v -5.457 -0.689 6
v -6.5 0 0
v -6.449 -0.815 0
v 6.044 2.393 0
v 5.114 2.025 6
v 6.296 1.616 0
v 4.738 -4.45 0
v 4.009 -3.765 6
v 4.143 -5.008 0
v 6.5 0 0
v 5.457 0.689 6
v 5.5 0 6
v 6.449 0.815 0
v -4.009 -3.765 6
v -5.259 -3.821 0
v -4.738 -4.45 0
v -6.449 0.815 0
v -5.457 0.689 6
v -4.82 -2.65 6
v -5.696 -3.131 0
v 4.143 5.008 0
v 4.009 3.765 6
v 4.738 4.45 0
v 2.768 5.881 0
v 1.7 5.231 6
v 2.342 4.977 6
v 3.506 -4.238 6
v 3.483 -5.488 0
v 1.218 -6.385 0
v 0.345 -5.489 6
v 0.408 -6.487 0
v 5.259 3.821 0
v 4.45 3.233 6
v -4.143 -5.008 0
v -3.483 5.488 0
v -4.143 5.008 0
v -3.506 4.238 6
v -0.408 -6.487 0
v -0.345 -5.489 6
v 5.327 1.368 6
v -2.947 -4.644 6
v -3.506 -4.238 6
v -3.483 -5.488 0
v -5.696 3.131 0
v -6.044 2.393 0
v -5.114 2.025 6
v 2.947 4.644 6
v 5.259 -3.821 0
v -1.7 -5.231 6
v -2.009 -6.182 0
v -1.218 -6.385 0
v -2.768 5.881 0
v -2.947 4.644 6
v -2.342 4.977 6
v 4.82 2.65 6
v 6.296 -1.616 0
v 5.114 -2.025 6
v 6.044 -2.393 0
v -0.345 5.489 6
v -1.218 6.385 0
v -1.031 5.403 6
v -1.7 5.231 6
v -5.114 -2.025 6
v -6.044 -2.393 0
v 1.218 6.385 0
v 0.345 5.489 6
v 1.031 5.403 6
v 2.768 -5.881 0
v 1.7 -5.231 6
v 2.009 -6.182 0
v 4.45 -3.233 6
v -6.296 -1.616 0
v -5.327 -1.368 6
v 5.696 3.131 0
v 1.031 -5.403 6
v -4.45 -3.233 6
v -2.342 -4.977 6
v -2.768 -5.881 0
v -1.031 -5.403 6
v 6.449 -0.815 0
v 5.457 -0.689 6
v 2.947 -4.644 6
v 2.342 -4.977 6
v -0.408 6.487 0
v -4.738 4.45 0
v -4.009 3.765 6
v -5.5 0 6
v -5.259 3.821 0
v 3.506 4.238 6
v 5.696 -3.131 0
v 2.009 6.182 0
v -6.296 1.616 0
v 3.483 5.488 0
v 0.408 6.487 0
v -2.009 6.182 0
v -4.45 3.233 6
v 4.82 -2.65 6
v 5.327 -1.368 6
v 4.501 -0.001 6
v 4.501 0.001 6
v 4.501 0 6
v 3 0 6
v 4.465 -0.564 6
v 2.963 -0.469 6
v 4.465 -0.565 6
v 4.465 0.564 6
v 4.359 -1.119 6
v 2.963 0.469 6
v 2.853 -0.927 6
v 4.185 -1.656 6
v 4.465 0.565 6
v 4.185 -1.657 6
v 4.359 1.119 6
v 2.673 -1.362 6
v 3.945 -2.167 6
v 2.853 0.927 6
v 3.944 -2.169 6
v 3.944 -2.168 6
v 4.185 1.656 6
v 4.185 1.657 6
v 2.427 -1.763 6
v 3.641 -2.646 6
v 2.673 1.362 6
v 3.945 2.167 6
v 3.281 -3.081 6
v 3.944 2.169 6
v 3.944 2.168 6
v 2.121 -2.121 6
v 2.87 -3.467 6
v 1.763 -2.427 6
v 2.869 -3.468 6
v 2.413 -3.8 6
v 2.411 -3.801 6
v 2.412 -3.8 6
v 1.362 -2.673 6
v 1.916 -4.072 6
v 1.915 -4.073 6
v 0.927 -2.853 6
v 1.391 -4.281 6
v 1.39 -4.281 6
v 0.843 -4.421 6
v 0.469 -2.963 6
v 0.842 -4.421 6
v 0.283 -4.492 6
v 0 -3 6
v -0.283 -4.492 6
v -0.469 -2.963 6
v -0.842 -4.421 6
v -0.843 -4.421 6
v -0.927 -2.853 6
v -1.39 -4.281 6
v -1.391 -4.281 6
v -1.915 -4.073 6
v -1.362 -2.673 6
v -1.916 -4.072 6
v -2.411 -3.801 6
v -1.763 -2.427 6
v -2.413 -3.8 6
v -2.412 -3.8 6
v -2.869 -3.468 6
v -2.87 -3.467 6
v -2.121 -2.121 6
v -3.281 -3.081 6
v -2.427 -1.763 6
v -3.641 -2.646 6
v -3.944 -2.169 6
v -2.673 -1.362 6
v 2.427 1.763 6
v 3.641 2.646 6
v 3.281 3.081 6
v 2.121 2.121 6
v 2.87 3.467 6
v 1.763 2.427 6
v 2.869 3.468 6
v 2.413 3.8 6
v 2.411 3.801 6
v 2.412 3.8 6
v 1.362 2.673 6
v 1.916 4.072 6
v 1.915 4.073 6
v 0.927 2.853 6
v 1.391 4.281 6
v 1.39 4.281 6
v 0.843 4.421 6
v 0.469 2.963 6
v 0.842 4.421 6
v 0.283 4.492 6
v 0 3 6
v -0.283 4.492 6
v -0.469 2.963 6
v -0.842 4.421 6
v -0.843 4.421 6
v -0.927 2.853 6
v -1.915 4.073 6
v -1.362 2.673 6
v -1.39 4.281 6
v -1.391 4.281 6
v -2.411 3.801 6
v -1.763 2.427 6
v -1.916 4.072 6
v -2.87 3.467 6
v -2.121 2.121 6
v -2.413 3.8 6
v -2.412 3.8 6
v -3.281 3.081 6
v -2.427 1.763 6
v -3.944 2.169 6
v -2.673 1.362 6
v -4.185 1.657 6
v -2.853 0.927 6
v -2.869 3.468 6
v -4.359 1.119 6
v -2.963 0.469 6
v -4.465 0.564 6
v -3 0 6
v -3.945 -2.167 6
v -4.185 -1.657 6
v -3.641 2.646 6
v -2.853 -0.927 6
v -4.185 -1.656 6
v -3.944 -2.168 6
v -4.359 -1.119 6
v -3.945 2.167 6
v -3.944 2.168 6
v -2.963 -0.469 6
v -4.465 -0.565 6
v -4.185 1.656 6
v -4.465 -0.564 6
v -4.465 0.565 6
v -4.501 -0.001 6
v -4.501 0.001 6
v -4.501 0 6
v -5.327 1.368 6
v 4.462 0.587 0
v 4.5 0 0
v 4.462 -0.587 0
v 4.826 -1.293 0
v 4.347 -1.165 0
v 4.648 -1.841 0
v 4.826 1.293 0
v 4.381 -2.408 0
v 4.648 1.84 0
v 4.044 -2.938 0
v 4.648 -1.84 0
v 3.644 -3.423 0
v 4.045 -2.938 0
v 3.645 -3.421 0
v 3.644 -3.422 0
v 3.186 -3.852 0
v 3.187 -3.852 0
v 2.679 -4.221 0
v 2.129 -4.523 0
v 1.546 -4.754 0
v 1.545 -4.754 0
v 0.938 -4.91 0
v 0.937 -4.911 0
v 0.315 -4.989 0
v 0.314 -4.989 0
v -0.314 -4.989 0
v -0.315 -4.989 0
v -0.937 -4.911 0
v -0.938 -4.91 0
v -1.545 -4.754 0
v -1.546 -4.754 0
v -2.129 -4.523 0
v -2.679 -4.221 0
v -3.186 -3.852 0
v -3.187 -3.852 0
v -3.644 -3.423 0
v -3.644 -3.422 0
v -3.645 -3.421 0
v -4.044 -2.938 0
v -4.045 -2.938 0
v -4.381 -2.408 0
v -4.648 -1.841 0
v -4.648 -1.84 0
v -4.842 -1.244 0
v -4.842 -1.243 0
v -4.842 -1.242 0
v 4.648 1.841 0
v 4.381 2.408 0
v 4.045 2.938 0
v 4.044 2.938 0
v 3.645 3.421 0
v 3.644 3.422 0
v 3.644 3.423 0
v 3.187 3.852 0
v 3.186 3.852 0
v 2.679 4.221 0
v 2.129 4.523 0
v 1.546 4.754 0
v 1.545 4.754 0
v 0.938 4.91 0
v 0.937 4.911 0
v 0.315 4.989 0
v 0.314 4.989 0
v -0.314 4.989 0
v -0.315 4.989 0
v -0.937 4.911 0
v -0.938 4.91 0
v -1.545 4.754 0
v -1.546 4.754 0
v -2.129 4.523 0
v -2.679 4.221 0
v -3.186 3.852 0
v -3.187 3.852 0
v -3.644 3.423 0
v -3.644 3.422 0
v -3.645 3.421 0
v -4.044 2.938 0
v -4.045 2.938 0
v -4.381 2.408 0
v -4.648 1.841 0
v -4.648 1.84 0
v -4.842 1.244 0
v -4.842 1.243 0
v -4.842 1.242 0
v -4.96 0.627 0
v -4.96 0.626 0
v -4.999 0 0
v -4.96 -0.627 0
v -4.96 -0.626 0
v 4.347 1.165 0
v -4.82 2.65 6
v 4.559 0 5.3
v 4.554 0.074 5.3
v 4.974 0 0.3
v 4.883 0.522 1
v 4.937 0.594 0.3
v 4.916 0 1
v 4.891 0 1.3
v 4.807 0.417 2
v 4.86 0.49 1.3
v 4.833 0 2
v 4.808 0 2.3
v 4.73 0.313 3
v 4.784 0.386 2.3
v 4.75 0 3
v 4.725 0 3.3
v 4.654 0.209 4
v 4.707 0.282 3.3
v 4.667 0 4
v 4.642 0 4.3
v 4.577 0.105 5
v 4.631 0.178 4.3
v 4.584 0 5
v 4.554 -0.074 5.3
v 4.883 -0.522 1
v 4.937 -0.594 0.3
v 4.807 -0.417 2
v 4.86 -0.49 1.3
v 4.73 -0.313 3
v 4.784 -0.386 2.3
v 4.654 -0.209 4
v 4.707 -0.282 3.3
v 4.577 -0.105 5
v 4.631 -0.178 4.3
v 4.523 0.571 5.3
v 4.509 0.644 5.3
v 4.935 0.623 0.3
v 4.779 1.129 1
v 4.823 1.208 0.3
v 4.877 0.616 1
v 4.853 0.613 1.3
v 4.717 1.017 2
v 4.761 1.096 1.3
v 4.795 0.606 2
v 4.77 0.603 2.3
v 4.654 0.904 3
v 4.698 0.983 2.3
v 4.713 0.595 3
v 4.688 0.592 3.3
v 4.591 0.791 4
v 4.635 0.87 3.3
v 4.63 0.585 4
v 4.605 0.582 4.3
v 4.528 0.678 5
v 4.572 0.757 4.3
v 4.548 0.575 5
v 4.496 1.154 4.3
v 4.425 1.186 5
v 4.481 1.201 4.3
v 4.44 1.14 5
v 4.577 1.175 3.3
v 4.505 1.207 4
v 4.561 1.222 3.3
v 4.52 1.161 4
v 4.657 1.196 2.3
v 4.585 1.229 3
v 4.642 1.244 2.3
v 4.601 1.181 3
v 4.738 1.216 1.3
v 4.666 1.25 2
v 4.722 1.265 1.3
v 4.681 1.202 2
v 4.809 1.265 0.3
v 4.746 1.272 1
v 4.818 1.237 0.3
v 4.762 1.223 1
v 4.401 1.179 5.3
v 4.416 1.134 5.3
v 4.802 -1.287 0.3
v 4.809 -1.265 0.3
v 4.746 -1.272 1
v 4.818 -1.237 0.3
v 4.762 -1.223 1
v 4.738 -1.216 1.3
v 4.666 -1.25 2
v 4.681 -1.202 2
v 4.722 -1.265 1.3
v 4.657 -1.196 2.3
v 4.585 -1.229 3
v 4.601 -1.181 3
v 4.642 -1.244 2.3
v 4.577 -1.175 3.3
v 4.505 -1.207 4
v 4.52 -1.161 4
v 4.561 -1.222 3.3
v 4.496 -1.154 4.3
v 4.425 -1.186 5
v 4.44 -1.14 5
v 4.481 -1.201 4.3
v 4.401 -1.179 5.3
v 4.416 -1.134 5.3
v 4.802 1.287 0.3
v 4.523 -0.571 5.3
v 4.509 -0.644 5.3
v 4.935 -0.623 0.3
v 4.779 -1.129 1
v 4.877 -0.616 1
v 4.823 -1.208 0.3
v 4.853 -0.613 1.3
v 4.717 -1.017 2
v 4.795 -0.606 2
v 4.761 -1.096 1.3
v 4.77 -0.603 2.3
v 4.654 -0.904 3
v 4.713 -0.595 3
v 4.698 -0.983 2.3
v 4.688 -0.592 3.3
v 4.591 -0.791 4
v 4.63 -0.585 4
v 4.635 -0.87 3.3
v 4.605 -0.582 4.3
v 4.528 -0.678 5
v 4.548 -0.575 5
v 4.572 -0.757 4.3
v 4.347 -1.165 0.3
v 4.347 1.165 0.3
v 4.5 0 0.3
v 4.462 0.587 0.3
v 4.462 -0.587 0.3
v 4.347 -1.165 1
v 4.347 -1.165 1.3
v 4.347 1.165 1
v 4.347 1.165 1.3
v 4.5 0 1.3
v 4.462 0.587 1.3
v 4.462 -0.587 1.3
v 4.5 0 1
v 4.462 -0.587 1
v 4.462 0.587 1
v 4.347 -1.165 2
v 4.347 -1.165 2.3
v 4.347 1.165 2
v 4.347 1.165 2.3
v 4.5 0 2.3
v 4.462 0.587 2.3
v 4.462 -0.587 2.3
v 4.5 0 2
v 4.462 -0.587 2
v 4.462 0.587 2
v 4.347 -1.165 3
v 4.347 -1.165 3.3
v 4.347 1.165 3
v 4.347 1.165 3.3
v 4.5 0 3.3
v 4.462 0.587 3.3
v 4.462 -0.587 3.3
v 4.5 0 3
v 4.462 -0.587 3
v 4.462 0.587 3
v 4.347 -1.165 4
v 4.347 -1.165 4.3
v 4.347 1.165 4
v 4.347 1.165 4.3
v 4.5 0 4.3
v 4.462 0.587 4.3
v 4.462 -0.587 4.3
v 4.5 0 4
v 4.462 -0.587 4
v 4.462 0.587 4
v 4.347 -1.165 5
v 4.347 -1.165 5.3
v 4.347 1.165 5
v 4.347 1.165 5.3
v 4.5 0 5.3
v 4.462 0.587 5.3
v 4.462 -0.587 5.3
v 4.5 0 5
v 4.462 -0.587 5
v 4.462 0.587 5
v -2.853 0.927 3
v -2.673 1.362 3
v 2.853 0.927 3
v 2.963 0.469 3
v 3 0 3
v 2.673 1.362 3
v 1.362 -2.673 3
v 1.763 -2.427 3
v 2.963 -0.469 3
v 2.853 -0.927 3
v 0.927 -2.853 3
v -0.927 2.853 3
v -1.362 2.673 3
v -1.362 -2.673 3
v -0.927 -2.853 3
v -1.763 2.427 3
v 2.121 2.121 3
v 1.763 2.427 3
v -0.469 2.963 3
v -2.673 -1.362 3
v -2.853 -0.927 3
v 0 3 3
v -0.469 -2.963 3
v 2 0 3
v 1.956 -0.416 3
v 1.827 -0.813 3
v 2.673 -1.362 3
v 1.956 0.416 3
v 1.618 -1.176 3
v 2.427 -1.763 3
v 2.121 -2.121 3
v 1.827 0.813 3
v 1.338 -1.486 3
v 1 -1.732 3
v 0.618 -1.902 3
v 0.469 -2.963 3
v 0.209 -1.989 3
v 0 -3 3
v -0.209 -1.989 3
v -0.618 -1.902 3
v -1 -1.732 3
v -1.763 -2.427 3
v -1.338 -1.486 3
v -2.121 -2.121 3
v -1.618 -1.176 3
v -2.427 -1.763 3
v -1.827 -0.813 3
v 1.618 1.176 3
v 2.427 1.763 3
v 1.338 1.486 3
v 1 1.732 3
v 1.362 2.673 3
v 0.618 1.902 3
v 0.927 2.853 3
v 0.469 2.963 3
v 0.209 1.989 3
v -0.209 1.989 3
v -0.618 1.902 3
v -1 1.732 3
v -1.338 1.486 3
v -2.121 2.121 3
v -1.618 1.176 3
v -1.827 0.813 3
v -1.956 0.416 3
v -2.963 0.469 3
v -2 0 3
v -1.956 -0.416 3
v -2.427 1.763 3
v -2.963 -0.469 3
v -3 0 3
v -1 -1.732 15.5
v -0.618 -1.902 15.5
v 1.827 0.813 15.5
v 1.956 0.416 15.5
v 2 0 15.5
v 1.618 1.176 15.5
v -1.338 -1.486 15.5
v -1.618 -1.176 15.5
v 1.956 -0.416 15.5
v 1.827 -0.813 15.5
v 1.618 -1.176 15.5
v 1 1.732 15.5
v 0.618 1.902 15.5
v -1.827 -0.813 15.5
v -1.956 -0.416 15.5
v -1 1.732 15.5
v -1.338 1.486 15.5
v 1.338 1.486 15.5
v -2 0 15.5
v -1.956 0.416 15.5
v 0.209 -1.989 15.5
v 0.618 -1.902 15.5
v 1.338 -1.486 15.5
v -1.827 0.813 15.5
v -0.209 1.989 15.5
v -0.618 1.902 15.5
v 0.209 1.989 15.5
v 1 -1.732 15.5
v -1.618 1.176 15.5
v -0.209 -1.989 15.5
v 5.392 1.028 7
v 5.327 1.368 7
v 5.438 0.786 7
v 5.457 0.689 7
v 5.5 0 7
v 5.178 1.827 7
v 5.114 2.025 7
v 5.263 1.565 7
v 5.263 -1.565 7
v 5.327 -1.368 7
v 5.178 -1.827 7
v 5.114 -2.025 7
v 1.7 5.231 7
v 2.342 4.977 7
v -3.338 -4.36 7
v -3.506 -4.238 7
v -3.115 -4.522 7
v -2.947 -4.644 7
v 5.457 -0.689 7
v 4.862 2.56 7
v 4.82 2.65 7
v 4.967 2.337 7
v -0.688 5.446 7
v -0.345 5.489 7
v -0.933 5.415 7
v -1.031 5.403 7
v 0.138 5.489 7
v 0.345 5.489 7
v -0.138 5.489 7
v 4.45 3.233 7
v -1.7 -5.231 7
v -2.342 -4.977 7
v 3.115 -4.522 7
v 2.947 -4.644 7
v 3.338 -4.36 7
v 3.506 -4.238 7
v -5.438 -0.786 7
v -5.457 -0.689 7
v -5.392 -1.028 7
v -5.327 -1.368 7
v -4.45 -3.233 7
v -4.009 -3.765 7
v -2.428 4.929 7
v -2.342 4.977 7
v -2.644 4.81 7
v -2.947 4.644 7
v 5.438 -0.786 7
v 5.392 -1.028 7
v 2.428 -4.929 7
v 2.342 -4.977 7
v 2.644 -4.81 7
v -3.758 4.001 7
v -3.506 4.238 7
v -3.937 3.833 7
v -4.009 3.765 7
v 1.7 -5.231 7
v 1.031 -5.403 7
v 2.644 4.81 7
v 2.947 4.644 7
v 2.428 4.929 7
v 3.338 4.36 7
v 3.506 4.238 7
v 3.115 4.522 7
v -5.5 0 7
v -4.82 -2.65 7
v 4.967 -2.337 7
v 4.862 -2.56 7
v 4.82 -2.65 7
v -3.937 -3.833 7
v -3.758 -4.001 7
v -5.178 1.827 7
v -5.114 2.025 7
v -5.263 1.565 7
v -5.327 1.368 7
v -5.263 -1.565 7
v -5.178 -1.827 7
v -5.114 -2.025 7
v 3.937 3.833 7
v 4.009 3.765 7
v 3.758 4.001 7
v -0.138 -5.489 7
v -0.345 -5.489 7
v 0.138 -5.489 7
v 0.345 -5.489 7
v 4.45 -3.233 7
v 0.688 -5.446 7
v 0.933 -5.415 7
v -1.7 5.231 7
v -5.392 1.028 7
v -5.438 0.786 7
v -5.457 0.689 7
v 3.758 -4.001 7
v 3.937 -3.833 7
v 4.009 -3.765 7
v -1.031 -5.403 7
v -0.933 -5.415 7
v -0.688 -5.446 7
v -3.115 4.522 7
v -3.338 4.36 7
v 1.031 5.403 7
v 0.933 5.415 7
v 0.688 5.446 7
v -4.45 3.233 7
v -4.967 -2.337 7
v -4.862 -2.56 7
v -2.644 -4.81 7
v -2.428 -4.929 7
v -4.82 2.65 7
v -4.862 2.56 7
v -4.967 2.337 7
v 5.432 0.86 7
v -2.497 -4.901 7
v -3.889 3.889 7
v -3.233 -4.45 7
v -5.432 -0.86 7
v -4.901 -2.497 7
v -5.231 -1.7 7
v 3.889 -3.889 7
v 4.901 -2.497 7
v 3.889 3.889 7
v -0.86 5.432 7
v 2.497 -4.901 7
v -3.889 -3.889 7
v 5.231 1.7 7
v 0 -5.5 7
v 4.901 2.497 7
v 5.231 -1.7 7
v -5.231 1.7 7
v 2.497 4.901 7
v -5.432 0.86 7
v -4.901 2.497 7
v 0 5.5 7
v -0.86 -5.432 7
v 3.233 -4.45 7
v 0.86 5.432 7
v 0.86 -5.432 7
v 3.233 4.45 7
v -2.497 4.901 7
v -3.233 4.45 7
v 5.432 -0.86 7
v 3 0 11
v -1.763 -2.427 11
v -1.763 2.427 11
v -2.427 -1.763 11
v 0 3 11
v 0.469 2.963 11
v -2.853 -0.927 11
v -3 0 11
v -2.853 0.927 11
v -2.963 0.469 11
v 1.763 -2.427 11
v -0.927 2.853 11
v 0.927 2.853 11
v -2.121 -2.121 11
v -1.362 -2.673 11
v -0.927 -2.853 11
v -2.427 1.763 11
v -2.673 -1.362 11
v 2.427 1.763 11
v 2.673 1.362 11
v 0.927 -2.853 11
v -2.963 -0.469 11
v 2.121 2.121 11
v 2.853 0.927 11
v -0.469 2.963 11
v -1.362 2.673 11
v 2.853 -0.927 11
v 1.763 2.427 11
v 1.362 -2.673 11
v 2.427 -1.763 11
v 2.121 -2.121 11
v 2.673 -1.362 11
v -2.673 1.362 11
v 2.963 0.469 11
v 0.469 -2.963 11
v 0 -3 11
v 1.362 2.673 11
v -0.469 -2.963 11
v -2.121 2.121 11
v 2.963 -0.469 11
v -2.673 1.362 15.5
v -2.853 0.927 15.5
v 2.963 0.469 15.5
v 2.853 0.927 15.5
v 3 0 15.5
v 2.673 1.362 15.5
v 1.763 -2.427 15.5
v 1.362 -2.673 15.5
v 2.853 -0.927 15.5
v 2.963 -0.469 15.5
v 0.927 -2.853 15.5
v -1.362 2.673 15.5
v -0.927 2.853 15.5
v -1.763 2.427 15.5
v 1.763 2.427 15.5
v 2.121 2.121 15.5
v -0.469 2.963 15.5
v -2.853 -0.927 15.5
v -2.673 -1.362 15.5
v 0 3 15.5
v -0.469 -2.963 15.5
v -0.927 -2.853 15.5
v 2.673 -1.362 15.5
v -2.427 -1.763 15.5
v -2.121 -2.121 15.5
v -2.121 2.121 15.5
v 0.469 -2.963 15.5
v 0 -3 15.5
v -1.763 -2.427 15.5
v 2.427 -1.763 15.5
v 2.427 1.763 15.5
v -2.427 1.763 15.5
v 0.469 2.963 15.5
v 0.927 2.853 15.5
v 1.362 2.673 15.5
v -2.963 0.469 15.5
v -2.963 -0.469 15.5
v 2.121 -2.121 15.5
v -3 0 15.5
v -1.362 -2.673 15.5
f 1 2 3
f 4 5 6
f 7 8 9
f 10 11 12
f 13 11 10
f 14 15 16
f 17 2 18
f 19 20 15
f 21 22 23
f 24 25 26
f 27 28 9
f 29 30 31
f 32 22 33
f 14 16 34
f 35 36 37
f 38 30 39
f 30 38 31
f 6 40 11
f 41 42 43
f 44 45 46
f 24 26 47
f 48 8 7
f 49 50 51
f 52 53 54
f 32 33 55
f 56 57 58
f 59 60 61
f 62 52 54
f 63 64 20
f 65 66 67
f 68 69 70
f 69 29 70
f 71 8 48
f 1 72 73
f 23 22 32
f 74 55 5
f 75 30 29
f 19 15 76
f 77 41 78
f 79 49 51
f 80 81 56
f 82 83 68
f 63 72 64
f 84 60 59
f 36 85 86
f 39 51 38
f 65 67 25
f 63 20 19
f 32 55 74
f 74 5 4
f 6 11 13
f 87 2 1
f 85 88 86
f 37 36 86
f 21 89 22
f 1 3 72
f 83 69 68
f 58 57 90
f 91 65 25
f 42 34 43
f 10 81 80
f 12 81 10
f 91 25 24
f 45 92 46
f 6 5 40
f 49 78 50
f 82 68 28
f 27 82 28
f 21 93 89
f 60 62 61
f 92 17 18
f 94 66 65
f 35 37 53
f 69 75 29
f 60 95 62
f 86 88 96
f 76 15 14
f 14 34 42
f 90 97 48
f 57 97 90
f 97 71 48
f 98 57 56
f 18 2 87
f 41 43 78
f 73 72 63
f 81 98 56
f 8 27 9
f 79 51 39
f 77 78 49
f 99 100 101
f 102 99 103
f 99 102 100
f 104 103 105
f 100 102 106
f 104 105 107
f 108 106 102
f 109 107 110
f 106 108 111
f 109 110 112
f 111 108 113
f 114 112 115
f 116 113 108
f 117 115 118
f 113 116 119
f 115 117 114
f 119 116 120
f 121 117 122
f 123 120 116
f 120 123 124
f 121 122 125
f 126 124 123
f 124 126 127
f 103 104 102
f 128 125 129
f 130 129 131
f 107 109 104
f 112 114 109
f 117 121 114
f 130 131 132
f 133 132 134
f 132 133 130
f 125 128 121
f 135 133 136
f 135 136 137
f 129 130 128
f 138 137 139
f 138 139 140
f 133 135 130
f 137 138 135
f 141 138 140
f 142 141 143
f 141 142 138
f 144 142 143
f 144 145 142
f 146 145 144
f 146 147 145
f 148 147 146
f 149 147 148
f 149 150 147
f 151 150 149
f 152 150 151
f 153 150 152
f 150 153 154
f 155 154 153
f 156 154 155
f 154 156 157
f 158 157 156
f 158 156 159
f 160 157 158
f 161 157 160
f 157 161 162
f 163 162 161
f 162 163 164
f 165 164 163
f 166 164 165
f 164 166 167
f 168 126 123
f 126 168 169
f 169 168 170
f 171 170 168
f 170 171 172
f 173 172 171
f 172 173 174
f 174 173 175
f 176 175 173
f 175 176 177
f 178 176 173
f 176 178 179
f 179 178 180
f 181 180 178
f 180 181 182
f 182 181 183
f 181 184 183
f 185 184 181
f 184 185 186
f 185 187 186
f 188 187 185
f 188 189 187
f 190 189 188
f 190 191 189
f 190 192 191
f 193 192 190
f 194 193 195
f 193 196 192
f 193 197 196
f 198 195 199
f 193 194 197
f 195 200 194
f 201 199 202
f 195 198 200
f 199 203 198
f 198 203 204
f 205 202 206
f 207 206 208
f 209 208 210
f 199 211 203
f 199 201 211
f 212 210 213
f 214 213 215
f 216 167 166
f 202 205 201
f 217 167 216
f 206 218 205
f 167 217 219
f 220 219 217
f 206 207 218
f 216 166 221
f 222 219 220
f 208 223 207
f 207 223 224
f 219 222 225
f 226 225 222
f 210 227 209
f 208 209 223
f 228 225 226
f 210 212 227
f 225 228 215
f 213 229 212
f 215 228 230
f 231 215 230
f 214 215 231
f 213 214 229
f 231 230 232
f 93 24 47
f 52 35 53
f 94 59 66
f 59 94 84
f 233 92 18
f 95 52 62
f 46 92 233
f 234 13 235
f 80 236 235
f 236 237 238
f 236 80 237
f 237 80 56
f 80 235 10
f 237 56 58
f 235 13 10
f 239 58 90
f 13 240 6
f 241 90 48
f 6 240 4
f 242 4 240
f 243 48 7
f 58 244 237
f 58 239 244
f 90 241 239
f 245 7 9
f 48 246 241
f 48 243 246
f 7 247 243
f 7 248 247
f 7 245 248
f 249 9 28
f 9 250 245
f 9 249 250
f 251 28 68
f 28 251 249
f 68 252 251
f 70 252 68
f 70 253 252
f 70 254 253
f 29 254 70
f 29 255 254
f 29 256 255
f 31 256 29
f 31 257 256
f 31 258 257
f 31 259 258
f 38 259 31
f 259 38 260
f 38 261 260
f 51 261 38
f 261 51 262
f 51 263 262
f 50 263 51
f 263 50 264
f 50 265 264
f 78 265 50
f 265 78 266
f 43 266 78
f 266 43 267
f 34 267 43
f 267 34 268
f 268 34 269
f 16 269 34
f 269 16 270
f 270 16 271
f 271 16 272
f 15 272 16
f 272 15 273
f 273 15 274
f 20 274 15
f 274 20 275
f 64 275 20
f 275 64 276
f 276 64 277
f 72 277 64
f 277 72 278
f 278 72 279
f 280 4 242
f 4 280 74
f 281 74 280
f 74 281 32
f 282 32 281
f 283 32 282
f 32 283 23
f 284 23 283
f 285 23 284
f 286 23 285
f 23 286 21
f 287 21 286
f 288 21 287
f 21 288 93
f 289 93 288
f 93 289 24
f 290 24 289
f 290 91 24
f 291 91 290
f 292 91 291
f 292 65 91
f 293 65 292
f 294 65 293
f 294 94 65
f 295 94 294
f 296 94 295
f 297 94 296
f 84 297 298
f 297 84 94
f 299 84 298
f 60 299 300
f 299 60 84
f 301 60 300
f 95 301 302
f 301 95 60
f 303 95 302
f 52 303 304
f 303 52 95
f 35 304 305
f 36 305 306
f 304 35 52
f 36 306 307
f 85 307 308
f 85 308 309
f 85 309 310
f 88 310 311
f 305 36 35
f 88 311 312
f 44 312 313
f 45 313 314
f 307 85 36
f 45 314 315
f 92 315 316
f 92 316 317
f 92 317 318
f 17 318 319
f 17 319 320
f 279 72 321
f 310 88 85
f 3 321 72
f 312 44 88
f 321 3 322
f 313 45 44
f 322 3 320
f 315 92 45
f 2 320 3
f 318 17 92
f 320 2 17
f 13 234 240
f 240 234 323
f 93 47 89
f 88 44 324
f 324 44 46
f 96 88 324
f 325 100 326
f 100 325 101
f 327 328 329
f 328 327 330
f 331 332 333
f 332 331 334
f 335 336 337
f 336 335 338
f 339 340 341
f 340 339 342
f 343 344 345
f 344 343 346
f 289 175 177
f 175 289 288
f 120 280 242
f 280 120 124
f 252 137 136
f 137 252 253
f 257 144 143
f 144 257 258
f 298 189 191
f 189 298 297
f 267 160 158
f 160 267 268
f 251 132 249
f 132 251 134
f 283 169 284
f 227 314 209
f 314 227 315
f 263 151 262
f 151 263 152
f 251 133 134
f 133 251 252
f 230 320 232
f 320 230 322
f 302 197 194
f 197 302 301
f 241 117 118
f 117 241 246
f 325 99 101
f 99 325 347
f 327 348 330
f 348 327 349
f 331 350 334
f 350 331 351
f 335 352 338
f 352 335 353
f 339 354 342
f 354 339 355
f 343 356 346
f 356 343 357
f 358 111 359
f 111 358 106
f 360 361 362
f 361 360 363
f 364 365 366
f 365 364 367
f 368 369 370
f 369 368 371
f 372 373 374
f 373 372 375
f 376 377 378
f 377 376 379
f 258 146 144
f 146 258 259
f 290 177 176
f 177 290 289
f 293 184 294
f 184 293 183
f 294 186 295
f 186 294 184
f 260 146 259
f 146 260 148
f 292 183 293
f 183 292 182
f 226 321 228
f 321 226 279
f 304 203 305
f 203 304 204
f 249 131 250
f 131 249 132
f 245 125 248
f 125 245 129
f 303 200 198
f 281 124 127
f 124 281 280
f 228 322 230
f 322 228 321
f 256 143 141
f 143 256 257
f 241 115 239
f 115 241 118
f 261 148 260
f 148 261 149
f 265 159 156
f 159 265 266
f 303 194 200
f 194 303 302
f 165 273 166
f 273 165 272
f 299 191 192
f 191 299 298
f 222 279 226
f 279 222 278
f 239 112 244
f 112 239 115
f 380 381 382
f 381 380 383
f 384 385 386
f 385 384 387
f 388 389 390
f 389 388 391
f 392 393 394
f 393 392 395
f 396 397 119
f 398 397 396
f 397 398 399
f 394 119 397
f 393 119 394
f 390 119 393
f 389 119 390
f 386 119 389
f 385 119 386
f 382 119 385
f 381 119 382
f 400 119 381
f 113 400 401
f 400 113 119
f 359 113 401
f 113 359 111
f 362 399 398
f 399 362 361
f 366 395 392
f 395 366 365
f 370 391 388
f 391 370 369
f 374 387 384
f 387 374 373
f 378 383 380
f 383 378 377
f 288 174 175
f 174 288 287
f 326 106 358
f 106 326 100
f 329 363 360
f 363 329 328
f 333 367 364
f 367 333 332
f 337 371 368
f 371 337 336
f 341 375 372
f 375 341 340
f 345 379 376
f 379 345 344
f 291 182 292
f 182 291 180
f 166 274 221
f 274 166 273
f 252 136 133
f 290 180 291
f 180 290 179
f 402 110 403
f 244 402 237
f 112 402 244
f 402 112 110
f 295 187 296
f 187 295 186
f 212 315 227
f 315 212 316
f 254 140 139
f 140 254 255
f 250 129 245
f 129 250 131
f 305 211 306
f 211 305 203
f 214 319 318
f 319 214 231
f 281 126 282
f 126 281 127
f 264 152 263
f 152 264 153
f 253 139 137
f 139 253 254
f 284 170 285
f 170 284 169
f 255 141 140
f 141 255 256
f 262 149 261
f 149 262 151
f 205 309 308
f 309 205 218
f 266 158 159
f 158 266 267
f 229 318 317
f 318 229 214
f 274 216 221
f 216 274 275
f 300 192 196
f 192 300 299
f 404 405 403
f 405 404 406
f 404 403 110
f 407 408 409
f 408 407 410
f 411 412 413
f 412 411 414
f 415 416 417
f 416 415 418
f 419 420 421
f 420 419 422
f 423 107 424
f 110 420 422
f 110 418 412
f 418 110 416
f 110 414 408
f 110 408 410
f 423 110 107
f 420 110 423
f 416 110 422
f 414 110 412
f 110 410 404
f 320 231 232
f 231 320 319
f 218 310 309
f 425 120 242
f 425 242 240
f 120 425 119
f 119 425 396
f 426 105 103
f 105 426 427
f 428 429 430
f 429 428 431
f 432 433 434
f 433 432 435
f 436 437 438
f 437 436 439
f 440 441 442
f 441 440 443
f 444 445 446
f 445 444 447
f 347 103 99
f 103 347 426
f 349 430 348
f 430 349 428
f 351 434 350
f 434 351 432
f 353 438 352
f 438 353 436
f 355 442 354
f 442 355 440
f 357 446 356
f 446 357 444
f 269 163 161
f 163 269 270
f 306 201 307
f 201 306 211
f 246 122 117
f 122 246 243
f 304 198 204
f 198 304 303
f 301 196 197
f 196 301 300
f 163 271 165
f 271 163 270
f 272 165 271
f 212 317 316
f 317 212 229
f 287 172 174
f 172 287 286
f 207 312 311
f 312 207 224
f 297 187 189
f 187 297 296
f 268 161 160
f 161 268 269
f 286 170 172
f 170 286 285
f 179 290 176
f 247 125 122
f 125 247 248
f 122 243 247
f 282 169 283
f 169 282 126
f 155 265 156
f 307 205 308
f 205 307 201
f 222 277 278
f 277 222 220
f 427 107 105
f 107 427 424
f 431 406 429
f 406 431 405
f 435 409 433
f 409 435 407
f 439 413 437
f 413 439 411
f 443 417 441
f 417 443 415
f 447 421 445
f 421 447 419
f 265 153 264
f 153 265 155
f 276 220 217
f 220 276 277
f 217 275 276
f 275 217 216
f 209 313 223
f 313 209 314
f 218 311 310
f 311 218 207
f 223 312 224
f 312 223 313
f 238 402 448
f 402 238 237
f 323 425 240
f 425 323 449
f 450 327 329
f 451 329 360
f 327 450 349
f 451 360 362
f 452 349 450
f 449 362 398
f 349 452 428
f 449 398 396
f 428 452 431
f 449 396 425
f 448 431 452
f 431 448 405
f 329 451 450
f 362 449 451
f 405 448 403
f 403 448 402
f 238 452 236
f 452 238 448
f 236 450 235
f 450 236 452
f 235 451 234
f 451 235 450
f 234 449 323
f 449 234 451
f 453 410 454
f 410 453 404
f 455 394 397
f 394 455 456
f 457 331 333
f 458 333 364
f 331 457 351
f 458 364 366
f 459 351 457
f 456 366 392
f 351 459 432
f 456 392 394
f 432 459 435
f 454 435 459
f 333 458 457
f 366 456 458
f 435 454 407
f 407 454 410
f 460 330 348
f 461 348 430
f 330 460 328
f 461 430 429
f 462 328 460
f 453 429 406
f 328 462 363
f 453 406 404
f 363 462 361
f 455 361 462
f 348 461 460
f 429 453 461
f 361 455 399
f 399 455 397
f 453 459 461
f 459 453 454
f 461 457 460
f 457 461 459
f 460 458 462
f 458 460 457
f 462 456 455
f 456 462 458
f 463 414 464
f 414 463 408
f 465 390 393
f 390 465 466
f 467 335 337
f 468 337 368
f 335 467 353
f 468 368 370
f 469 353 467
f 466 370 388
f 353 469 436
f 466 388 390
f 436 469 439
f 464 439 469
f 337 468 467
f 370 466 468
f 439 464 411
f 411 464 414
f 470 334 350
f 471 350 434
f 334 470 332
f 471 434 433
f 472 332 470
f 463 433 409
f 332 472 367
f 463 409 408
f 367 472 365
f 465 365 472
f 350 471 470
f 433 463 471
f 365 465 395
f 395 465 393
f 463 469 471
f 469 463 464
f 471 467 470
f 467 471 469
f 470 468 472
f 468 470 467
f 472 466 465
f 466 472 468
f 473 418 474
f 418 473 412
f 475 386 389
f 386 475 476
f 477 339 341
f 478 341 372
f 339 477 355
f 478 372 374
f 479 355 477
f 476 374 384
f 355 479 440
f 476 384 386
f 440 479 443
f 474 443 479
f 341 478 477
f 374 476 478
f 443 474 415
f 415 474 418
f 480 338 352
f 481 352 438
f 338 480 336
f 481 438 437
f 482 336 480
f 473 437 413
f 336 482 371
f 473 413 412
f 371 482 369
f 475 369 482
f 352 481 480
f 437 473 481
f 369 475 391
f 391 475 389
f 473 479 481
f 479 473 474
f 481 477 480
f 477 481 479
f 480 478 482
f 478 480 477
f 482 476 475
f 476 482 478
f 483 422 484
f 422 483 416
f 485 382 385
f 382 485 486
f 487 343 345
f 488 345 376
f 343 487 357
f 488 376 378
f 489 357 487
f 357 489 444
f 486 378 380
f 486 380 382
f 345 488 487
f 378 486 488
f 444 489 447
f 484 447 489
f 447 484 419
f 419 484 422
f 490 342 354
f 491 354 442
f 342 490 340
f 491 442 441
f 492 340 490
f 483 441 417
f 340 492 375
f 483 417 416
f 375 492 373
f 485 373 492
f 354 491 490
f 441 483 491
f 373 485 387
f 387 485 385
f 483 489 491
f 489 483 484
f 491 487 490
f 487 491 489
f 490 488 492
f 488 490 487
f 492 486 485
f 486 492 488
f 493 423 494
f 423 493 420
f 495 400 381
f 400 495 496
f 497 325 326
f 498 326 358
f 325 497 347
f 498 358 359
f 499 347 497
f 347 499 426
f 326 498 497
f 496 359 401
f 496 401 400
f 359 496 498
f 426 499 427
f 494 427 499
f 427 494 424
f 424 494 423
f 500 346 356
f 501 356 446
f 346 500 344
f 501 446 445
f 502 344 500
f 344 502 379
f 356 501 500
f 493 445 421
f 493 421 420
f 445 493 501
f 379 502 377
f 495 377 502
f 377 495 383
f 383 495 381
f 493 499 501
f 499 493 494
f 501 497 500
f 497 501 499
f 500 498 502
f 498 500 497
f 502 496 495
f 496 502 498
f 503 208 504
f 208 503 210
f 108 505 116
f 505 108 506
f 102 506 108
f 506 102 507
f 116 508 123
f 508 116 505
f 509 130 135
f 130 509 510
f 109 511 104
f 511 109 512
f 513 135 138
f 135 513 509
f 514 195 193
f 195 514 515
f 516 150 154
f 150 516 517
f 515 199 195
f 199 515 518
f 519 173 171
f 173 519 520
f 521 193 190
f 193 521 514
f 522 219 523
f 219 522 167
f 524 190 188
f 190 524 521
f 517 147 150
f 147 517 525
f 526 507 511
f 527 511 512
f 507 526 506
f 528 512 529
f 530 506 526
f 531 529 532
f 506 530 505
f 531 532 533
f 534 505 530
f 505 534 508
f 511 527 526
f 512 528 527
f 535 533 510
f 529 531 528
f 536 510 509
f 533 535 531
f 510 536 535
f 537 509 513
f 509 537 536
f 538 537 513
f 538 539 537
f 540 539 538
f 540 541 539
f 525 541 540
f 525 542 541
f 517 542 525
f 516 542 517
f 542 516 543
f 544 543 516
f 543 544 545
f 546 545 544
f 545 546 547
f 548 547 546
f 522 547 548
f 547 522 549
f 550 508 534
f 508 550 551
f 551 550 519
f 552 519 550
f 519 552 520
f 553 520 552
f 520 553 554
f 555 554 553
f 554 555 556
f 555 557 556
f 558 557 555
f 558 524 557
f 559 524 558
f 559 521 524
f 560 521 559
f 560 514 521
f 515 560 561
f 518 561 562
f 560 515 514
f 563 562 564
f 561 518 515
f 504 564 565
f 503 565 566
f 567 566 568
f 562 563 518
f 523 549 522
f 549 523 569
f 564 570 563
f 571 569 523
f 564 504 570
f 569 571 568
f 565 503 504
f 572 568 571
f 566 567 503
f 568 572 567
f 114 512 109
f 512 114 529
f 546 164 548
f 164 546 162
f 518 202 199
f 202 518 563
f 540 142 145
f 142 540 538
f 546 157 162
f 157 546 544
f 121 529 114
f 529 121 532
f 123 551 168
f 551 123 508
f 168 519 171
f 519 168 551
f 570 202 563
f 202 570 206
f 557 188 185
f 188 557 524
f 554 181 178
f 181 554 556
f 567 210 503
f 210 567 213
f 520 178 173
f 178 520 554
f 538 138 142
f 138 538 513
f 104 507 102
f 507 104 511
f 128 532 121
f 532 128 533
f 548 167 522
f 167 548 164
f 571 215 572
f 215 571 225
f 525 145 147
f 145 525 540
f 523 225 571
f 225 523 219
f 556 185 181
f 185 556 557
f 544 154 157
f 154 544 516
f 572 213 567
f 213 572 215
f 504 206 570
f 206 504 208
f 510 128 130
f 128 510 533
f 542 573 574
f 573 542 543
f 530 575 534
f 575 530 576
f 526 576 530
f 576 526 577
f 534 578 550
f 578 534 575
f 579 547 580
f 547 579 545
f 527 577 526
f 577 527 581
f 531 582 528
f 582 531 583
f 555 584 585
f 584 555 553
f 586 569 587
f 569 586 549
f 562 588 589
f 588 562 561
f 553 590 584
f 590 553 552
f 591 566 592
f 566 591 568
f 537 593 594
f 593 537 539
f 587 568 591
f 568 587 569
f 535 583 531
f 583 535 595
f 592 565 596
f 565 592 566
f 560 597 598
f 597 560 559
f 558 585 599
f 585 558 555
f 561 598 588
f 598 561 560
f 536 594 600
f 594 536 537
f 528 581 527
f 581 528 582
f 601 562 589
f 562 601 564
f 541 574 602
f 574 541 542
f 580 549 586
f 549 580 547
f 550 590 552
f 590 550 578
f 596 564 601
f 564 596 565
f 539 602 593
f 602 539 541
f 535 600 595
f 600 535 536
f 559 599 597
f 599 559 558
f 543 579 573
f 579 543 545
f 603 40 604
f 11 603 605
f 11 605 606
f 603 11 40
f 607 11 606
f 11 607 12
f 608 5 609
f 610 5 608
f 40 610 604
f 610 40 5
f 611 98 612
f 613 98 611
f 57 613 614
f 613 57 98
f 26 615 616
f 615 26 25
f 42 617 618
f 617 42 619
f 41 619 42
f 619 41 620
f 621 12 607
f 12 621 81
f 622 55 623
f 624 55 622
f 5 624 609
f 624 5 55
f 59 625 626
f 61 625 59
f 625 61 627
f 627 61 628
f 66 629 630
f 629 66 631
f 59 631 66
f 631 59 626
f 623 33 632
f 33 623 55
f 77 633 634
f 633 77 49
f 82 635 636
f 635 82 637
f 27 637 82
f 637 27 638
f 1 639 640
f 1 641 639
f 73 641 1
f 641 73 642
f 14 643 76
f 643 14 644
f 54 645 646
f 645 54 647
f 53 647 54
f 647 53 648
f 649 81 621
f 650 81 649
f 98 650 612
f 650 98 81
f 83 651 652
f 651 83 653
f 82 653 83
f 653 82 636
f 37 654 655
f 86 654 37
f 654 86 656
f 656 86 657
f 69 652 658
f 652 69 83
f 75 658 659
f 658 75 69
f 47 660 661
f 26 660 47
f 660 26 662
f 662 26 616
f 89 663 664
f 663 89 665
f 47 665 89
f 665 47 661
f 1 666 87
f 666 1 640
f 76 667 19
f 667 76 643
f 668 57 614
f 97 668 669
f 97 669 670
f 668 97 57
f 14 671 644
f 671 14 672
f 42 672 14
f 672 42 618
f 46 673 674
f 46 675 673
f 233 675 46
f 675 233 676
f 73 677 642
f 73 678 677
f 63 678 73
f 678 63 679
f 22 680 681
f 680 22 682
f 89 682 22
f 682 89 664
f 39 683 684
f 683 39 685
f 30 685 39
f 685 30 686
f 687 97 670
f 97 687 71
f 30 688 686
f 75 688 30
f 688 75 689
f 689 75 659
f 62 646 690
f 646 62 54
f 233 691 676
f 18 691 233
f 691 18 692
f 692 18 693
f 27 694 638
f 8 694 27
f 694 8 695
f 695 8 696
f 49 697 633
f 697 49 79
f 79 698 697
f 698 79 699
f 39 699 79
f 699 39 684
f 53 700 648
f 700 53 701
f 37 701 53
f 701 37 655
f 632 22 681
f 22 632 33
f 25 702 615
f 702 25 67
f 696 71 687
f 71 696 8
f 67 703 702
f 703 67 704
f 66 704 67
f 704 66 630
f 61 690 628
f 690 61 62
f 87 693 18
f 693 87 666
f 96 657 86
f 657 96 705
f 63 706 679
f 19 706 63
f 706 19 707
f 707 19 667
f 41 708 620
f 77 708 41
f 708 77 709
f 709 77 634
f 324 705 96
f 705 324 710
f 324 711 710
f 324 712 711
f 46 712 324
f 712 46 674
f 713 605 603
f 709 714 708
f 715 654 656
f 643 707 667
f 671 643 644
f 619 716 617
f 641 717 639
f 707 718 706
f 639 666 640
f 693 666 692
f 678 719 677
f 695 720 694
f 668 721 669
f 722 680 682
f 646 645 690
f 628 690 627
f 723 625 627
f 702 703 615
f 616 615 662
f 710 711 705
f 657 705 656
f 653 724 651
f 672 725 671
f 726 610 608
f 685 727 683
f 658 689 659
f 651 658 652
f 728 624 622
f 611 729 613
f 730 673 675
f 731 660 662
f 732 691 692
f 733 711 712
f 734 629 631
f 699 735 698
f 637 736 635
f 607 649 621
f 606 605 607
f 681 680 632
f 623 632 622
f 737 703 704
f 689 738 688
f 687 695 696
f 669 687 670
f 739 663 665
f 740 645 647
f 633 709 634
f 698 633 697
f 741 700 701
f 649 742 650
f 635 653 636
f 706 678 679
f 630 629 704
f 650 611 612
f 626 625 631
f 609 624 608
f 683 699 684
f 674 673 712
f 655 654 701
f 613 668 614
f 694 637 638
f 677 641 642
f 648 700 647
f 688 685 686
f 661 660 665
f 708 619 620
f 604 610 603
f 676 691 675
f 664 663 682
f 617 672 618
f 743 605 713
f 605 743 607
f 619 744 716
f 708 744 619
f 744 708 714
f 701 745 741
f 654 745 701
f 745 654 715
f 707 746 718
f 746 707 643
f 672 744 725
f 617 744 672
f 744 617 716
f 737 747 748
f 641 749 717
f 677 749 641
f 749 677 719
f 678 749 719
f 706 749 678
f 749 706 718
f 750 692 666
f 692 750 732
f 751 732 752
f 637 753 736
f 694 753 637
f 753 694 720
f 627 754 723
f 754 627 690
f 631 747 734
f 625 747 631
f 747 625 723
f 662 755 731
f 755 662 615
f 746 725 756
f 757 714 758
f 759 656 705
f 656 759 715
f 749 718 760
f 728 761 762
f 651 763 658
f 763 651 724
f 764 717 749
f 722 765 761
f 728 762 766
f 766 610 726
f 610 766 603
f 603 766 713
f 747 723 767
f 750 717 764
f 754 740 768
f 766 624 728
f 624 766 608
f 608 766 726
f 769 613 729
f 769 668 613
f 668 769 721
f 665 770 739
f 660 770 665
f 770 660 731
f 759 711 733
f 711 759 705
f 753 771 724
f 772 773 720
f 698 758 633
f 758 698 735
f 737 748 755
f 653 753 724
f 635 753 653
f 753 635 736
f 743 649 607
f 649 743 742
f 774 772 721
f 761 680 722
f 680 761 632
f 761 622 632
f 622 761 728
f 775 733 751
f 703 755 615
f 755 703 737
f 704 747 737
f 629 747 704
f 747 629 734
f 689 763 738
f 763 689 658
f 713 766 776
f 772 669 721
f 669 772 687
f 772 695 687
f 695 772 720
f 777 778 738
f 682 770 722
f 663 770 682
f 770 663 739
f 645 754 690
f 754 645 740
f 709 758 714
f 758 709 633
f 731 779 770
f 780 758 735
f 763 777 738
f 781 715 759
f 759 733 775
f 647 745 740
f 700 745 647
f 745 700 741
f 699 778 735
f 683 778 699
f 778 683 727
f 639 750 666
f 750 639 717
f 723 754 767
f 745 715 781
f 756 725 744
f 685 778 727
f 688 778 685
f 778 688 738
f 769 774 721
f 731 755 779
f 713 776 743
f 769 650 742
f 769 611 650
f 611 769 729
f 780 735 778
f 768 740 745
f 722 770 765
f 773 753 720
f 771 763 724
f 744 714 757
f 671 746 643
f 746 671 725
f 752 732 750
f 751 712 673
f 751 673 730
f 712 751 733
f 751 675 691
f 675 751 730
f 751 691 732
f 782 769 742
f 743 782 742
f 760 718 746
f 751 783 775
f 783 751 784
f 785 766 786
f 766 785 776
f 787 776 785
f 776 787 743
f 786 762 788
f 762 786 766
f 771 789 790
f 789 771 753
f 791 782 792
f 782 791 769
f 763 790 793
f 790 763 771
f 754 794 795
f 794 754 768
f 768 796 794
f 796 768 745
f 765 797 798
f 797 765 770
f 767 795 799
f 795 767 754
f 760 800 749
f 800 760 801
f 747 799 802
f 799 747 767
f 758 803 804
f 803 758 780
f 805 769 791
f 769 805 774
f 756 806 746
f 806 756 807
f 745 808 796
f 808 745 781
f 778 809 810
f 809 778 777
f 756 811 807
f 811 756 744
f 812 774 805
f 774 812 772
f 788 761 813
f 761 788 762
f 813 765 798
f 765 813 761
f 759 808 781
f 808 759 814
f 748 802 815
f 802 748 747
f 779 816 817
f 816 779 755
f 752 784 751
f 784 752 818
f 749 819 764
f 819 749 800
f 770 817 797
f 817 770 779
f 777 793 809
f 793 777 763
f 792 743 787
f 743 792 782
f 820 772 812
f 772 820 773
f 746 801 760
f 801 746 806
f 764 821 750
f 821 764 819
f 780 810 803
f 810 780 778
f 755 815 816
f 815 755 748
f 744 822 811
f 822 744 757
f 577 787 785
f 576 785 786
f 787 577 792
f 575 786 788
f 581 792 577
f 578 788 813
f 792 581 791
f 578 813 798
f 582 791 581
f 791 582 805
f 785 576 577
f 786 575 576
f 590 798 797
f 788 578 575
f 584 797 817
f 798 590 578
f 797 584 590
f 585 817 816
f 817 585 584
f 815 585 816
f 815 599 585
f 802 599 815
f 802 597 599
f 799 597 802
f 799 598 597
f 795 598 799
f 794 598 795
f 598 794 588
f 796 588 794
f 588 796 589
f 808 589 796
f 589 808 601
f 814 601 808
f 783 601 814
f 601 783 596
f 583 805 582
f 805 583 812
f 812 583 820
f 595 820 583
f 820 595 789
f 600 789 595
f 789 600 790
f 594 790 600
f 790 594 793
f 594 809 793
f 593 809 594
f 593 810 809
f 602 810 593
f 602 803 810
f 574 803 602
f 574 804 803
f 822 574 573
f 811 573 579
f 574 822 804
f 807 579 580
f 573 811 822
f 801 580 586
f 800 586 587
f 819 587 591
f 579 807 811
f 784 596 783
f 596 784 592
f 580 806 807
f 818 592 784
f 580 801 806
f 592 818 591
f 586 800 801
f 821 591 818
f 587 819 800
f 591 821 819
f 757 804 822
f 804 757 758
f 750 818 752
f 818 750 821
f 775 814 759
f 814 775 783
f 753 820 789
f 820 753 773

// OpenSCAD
difference(){
  cylinder(d1=13,d2=11,h=6,$fn=50);
  translate([0,0,-.01]) cylinder(d1=10,d2=9,h=6.02,$fn=50);
}
for(z=[0:5]) translate([0,0,z]) rotate([0,0,-15]) rotate_extrude(angle=30,$fn=50) translate([4.5,0]) square([1,0.3]);
difference(){
  translate([0,0,3]) cylinder(d=6,h=3,$fn=40);
  translate([0,0,-.01]) cylinder(d=4,h=6.02,$fn=30);
}
translate([0,0,6]) difference() {
  cylinder(d=11,h=1,$fn=50);
  translate([0,0,-.01]) cylinder(d=4,h=1.02,$fn=30);
}
translate([0,0,7]) difference() {
  cylinder(d1=11,d2=6,h=4,$fn=40);
  translate([0,0,-.01]) cylinder(d=4,h=4.02,$fn=30);
}
translate([0,0,11]) difference() {
  cylinder(d=6,h=4.5,$fn=40);
  translate([0,0,-.01]) cylinder(d=4,h=4.52,$fn=30);
}
